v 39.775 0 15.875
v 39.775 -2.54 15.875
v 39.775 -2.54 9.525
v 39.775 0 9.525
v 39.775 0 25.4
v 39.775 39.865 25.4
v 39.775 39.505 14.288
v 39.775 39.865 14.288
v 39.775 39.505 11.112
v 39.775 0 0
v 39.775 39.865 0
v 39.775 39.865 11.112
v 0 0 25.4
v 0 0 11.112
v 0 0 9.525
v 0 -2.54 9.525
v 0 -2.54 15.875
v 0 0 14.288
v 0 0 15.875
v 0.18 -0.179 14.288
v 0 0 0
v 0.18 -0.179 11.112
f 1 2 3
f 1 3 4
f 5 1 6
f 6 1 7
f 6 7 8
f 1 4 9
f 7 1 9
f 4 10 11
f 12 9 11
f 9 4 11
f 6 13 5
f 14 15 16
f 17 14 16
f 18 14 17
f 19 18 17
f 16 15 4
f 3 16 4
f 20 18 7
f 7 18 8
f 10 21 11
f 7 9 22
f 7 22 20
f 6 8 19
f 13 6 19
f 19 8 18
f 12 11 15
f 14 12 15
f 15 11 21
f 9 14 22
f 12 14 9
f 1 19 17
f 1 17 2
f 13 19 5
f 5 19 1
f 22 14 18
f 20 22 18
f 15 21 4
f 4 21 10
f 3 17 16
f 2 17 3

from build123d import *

# Parameters (mm, degrees)
BOSS_EXTRUDE1_DEPTH = 25.4
SKETCH3_W           = 39.775281732
SKETCH3_H           = 6.35
BOSS_EXTRUDE2_DEPTH = 2.54
SKETCH4_W           = 3.175
SKETCH4_H           = 56.314123931
CUT_EXTRUDE1_DEPTH  = 0.254


with BuildPart() as part:
    # Sketch1 → Boss-Extrude1 (new body)
    with BuildSketch(Plane.XY):
        Polygon((0, 0), (16.712640866, 0), (23.062640866, 0), (39.775281732, 0), (39.775281732, 39.8648657), align=None)
    extrude(amount=BOSS_EXTRUDE1_DEPTH)

    # Sketch3 → Boss-Extrude2 (add)
    with BuildSketch(Plane.XZ):
        with Locations((19.887640866, 12.7)):
            Rectangle(SKETCH3_W, SKETCH3_H)
    extrude(amount=BOSS_EXTRUDE2_DEPTH)

    # Sketch4 → Cut-Extrude1 (cut)
    with BuildSketch(Plane(origin=(0, 0, 0), x_dir=(0, 0, 1), z_dir=(-0.7079017290339694, 0.706310938631646, 0))):
        with Locations((12.7, 28.157061966)):
            Rectangle(SKETCH4_W, SKETCH4_H)
    extrude(amount=-CUT_EXTRUDE1_DEPTH, mode=Mode.SUBTRACT)


solid = part.part
